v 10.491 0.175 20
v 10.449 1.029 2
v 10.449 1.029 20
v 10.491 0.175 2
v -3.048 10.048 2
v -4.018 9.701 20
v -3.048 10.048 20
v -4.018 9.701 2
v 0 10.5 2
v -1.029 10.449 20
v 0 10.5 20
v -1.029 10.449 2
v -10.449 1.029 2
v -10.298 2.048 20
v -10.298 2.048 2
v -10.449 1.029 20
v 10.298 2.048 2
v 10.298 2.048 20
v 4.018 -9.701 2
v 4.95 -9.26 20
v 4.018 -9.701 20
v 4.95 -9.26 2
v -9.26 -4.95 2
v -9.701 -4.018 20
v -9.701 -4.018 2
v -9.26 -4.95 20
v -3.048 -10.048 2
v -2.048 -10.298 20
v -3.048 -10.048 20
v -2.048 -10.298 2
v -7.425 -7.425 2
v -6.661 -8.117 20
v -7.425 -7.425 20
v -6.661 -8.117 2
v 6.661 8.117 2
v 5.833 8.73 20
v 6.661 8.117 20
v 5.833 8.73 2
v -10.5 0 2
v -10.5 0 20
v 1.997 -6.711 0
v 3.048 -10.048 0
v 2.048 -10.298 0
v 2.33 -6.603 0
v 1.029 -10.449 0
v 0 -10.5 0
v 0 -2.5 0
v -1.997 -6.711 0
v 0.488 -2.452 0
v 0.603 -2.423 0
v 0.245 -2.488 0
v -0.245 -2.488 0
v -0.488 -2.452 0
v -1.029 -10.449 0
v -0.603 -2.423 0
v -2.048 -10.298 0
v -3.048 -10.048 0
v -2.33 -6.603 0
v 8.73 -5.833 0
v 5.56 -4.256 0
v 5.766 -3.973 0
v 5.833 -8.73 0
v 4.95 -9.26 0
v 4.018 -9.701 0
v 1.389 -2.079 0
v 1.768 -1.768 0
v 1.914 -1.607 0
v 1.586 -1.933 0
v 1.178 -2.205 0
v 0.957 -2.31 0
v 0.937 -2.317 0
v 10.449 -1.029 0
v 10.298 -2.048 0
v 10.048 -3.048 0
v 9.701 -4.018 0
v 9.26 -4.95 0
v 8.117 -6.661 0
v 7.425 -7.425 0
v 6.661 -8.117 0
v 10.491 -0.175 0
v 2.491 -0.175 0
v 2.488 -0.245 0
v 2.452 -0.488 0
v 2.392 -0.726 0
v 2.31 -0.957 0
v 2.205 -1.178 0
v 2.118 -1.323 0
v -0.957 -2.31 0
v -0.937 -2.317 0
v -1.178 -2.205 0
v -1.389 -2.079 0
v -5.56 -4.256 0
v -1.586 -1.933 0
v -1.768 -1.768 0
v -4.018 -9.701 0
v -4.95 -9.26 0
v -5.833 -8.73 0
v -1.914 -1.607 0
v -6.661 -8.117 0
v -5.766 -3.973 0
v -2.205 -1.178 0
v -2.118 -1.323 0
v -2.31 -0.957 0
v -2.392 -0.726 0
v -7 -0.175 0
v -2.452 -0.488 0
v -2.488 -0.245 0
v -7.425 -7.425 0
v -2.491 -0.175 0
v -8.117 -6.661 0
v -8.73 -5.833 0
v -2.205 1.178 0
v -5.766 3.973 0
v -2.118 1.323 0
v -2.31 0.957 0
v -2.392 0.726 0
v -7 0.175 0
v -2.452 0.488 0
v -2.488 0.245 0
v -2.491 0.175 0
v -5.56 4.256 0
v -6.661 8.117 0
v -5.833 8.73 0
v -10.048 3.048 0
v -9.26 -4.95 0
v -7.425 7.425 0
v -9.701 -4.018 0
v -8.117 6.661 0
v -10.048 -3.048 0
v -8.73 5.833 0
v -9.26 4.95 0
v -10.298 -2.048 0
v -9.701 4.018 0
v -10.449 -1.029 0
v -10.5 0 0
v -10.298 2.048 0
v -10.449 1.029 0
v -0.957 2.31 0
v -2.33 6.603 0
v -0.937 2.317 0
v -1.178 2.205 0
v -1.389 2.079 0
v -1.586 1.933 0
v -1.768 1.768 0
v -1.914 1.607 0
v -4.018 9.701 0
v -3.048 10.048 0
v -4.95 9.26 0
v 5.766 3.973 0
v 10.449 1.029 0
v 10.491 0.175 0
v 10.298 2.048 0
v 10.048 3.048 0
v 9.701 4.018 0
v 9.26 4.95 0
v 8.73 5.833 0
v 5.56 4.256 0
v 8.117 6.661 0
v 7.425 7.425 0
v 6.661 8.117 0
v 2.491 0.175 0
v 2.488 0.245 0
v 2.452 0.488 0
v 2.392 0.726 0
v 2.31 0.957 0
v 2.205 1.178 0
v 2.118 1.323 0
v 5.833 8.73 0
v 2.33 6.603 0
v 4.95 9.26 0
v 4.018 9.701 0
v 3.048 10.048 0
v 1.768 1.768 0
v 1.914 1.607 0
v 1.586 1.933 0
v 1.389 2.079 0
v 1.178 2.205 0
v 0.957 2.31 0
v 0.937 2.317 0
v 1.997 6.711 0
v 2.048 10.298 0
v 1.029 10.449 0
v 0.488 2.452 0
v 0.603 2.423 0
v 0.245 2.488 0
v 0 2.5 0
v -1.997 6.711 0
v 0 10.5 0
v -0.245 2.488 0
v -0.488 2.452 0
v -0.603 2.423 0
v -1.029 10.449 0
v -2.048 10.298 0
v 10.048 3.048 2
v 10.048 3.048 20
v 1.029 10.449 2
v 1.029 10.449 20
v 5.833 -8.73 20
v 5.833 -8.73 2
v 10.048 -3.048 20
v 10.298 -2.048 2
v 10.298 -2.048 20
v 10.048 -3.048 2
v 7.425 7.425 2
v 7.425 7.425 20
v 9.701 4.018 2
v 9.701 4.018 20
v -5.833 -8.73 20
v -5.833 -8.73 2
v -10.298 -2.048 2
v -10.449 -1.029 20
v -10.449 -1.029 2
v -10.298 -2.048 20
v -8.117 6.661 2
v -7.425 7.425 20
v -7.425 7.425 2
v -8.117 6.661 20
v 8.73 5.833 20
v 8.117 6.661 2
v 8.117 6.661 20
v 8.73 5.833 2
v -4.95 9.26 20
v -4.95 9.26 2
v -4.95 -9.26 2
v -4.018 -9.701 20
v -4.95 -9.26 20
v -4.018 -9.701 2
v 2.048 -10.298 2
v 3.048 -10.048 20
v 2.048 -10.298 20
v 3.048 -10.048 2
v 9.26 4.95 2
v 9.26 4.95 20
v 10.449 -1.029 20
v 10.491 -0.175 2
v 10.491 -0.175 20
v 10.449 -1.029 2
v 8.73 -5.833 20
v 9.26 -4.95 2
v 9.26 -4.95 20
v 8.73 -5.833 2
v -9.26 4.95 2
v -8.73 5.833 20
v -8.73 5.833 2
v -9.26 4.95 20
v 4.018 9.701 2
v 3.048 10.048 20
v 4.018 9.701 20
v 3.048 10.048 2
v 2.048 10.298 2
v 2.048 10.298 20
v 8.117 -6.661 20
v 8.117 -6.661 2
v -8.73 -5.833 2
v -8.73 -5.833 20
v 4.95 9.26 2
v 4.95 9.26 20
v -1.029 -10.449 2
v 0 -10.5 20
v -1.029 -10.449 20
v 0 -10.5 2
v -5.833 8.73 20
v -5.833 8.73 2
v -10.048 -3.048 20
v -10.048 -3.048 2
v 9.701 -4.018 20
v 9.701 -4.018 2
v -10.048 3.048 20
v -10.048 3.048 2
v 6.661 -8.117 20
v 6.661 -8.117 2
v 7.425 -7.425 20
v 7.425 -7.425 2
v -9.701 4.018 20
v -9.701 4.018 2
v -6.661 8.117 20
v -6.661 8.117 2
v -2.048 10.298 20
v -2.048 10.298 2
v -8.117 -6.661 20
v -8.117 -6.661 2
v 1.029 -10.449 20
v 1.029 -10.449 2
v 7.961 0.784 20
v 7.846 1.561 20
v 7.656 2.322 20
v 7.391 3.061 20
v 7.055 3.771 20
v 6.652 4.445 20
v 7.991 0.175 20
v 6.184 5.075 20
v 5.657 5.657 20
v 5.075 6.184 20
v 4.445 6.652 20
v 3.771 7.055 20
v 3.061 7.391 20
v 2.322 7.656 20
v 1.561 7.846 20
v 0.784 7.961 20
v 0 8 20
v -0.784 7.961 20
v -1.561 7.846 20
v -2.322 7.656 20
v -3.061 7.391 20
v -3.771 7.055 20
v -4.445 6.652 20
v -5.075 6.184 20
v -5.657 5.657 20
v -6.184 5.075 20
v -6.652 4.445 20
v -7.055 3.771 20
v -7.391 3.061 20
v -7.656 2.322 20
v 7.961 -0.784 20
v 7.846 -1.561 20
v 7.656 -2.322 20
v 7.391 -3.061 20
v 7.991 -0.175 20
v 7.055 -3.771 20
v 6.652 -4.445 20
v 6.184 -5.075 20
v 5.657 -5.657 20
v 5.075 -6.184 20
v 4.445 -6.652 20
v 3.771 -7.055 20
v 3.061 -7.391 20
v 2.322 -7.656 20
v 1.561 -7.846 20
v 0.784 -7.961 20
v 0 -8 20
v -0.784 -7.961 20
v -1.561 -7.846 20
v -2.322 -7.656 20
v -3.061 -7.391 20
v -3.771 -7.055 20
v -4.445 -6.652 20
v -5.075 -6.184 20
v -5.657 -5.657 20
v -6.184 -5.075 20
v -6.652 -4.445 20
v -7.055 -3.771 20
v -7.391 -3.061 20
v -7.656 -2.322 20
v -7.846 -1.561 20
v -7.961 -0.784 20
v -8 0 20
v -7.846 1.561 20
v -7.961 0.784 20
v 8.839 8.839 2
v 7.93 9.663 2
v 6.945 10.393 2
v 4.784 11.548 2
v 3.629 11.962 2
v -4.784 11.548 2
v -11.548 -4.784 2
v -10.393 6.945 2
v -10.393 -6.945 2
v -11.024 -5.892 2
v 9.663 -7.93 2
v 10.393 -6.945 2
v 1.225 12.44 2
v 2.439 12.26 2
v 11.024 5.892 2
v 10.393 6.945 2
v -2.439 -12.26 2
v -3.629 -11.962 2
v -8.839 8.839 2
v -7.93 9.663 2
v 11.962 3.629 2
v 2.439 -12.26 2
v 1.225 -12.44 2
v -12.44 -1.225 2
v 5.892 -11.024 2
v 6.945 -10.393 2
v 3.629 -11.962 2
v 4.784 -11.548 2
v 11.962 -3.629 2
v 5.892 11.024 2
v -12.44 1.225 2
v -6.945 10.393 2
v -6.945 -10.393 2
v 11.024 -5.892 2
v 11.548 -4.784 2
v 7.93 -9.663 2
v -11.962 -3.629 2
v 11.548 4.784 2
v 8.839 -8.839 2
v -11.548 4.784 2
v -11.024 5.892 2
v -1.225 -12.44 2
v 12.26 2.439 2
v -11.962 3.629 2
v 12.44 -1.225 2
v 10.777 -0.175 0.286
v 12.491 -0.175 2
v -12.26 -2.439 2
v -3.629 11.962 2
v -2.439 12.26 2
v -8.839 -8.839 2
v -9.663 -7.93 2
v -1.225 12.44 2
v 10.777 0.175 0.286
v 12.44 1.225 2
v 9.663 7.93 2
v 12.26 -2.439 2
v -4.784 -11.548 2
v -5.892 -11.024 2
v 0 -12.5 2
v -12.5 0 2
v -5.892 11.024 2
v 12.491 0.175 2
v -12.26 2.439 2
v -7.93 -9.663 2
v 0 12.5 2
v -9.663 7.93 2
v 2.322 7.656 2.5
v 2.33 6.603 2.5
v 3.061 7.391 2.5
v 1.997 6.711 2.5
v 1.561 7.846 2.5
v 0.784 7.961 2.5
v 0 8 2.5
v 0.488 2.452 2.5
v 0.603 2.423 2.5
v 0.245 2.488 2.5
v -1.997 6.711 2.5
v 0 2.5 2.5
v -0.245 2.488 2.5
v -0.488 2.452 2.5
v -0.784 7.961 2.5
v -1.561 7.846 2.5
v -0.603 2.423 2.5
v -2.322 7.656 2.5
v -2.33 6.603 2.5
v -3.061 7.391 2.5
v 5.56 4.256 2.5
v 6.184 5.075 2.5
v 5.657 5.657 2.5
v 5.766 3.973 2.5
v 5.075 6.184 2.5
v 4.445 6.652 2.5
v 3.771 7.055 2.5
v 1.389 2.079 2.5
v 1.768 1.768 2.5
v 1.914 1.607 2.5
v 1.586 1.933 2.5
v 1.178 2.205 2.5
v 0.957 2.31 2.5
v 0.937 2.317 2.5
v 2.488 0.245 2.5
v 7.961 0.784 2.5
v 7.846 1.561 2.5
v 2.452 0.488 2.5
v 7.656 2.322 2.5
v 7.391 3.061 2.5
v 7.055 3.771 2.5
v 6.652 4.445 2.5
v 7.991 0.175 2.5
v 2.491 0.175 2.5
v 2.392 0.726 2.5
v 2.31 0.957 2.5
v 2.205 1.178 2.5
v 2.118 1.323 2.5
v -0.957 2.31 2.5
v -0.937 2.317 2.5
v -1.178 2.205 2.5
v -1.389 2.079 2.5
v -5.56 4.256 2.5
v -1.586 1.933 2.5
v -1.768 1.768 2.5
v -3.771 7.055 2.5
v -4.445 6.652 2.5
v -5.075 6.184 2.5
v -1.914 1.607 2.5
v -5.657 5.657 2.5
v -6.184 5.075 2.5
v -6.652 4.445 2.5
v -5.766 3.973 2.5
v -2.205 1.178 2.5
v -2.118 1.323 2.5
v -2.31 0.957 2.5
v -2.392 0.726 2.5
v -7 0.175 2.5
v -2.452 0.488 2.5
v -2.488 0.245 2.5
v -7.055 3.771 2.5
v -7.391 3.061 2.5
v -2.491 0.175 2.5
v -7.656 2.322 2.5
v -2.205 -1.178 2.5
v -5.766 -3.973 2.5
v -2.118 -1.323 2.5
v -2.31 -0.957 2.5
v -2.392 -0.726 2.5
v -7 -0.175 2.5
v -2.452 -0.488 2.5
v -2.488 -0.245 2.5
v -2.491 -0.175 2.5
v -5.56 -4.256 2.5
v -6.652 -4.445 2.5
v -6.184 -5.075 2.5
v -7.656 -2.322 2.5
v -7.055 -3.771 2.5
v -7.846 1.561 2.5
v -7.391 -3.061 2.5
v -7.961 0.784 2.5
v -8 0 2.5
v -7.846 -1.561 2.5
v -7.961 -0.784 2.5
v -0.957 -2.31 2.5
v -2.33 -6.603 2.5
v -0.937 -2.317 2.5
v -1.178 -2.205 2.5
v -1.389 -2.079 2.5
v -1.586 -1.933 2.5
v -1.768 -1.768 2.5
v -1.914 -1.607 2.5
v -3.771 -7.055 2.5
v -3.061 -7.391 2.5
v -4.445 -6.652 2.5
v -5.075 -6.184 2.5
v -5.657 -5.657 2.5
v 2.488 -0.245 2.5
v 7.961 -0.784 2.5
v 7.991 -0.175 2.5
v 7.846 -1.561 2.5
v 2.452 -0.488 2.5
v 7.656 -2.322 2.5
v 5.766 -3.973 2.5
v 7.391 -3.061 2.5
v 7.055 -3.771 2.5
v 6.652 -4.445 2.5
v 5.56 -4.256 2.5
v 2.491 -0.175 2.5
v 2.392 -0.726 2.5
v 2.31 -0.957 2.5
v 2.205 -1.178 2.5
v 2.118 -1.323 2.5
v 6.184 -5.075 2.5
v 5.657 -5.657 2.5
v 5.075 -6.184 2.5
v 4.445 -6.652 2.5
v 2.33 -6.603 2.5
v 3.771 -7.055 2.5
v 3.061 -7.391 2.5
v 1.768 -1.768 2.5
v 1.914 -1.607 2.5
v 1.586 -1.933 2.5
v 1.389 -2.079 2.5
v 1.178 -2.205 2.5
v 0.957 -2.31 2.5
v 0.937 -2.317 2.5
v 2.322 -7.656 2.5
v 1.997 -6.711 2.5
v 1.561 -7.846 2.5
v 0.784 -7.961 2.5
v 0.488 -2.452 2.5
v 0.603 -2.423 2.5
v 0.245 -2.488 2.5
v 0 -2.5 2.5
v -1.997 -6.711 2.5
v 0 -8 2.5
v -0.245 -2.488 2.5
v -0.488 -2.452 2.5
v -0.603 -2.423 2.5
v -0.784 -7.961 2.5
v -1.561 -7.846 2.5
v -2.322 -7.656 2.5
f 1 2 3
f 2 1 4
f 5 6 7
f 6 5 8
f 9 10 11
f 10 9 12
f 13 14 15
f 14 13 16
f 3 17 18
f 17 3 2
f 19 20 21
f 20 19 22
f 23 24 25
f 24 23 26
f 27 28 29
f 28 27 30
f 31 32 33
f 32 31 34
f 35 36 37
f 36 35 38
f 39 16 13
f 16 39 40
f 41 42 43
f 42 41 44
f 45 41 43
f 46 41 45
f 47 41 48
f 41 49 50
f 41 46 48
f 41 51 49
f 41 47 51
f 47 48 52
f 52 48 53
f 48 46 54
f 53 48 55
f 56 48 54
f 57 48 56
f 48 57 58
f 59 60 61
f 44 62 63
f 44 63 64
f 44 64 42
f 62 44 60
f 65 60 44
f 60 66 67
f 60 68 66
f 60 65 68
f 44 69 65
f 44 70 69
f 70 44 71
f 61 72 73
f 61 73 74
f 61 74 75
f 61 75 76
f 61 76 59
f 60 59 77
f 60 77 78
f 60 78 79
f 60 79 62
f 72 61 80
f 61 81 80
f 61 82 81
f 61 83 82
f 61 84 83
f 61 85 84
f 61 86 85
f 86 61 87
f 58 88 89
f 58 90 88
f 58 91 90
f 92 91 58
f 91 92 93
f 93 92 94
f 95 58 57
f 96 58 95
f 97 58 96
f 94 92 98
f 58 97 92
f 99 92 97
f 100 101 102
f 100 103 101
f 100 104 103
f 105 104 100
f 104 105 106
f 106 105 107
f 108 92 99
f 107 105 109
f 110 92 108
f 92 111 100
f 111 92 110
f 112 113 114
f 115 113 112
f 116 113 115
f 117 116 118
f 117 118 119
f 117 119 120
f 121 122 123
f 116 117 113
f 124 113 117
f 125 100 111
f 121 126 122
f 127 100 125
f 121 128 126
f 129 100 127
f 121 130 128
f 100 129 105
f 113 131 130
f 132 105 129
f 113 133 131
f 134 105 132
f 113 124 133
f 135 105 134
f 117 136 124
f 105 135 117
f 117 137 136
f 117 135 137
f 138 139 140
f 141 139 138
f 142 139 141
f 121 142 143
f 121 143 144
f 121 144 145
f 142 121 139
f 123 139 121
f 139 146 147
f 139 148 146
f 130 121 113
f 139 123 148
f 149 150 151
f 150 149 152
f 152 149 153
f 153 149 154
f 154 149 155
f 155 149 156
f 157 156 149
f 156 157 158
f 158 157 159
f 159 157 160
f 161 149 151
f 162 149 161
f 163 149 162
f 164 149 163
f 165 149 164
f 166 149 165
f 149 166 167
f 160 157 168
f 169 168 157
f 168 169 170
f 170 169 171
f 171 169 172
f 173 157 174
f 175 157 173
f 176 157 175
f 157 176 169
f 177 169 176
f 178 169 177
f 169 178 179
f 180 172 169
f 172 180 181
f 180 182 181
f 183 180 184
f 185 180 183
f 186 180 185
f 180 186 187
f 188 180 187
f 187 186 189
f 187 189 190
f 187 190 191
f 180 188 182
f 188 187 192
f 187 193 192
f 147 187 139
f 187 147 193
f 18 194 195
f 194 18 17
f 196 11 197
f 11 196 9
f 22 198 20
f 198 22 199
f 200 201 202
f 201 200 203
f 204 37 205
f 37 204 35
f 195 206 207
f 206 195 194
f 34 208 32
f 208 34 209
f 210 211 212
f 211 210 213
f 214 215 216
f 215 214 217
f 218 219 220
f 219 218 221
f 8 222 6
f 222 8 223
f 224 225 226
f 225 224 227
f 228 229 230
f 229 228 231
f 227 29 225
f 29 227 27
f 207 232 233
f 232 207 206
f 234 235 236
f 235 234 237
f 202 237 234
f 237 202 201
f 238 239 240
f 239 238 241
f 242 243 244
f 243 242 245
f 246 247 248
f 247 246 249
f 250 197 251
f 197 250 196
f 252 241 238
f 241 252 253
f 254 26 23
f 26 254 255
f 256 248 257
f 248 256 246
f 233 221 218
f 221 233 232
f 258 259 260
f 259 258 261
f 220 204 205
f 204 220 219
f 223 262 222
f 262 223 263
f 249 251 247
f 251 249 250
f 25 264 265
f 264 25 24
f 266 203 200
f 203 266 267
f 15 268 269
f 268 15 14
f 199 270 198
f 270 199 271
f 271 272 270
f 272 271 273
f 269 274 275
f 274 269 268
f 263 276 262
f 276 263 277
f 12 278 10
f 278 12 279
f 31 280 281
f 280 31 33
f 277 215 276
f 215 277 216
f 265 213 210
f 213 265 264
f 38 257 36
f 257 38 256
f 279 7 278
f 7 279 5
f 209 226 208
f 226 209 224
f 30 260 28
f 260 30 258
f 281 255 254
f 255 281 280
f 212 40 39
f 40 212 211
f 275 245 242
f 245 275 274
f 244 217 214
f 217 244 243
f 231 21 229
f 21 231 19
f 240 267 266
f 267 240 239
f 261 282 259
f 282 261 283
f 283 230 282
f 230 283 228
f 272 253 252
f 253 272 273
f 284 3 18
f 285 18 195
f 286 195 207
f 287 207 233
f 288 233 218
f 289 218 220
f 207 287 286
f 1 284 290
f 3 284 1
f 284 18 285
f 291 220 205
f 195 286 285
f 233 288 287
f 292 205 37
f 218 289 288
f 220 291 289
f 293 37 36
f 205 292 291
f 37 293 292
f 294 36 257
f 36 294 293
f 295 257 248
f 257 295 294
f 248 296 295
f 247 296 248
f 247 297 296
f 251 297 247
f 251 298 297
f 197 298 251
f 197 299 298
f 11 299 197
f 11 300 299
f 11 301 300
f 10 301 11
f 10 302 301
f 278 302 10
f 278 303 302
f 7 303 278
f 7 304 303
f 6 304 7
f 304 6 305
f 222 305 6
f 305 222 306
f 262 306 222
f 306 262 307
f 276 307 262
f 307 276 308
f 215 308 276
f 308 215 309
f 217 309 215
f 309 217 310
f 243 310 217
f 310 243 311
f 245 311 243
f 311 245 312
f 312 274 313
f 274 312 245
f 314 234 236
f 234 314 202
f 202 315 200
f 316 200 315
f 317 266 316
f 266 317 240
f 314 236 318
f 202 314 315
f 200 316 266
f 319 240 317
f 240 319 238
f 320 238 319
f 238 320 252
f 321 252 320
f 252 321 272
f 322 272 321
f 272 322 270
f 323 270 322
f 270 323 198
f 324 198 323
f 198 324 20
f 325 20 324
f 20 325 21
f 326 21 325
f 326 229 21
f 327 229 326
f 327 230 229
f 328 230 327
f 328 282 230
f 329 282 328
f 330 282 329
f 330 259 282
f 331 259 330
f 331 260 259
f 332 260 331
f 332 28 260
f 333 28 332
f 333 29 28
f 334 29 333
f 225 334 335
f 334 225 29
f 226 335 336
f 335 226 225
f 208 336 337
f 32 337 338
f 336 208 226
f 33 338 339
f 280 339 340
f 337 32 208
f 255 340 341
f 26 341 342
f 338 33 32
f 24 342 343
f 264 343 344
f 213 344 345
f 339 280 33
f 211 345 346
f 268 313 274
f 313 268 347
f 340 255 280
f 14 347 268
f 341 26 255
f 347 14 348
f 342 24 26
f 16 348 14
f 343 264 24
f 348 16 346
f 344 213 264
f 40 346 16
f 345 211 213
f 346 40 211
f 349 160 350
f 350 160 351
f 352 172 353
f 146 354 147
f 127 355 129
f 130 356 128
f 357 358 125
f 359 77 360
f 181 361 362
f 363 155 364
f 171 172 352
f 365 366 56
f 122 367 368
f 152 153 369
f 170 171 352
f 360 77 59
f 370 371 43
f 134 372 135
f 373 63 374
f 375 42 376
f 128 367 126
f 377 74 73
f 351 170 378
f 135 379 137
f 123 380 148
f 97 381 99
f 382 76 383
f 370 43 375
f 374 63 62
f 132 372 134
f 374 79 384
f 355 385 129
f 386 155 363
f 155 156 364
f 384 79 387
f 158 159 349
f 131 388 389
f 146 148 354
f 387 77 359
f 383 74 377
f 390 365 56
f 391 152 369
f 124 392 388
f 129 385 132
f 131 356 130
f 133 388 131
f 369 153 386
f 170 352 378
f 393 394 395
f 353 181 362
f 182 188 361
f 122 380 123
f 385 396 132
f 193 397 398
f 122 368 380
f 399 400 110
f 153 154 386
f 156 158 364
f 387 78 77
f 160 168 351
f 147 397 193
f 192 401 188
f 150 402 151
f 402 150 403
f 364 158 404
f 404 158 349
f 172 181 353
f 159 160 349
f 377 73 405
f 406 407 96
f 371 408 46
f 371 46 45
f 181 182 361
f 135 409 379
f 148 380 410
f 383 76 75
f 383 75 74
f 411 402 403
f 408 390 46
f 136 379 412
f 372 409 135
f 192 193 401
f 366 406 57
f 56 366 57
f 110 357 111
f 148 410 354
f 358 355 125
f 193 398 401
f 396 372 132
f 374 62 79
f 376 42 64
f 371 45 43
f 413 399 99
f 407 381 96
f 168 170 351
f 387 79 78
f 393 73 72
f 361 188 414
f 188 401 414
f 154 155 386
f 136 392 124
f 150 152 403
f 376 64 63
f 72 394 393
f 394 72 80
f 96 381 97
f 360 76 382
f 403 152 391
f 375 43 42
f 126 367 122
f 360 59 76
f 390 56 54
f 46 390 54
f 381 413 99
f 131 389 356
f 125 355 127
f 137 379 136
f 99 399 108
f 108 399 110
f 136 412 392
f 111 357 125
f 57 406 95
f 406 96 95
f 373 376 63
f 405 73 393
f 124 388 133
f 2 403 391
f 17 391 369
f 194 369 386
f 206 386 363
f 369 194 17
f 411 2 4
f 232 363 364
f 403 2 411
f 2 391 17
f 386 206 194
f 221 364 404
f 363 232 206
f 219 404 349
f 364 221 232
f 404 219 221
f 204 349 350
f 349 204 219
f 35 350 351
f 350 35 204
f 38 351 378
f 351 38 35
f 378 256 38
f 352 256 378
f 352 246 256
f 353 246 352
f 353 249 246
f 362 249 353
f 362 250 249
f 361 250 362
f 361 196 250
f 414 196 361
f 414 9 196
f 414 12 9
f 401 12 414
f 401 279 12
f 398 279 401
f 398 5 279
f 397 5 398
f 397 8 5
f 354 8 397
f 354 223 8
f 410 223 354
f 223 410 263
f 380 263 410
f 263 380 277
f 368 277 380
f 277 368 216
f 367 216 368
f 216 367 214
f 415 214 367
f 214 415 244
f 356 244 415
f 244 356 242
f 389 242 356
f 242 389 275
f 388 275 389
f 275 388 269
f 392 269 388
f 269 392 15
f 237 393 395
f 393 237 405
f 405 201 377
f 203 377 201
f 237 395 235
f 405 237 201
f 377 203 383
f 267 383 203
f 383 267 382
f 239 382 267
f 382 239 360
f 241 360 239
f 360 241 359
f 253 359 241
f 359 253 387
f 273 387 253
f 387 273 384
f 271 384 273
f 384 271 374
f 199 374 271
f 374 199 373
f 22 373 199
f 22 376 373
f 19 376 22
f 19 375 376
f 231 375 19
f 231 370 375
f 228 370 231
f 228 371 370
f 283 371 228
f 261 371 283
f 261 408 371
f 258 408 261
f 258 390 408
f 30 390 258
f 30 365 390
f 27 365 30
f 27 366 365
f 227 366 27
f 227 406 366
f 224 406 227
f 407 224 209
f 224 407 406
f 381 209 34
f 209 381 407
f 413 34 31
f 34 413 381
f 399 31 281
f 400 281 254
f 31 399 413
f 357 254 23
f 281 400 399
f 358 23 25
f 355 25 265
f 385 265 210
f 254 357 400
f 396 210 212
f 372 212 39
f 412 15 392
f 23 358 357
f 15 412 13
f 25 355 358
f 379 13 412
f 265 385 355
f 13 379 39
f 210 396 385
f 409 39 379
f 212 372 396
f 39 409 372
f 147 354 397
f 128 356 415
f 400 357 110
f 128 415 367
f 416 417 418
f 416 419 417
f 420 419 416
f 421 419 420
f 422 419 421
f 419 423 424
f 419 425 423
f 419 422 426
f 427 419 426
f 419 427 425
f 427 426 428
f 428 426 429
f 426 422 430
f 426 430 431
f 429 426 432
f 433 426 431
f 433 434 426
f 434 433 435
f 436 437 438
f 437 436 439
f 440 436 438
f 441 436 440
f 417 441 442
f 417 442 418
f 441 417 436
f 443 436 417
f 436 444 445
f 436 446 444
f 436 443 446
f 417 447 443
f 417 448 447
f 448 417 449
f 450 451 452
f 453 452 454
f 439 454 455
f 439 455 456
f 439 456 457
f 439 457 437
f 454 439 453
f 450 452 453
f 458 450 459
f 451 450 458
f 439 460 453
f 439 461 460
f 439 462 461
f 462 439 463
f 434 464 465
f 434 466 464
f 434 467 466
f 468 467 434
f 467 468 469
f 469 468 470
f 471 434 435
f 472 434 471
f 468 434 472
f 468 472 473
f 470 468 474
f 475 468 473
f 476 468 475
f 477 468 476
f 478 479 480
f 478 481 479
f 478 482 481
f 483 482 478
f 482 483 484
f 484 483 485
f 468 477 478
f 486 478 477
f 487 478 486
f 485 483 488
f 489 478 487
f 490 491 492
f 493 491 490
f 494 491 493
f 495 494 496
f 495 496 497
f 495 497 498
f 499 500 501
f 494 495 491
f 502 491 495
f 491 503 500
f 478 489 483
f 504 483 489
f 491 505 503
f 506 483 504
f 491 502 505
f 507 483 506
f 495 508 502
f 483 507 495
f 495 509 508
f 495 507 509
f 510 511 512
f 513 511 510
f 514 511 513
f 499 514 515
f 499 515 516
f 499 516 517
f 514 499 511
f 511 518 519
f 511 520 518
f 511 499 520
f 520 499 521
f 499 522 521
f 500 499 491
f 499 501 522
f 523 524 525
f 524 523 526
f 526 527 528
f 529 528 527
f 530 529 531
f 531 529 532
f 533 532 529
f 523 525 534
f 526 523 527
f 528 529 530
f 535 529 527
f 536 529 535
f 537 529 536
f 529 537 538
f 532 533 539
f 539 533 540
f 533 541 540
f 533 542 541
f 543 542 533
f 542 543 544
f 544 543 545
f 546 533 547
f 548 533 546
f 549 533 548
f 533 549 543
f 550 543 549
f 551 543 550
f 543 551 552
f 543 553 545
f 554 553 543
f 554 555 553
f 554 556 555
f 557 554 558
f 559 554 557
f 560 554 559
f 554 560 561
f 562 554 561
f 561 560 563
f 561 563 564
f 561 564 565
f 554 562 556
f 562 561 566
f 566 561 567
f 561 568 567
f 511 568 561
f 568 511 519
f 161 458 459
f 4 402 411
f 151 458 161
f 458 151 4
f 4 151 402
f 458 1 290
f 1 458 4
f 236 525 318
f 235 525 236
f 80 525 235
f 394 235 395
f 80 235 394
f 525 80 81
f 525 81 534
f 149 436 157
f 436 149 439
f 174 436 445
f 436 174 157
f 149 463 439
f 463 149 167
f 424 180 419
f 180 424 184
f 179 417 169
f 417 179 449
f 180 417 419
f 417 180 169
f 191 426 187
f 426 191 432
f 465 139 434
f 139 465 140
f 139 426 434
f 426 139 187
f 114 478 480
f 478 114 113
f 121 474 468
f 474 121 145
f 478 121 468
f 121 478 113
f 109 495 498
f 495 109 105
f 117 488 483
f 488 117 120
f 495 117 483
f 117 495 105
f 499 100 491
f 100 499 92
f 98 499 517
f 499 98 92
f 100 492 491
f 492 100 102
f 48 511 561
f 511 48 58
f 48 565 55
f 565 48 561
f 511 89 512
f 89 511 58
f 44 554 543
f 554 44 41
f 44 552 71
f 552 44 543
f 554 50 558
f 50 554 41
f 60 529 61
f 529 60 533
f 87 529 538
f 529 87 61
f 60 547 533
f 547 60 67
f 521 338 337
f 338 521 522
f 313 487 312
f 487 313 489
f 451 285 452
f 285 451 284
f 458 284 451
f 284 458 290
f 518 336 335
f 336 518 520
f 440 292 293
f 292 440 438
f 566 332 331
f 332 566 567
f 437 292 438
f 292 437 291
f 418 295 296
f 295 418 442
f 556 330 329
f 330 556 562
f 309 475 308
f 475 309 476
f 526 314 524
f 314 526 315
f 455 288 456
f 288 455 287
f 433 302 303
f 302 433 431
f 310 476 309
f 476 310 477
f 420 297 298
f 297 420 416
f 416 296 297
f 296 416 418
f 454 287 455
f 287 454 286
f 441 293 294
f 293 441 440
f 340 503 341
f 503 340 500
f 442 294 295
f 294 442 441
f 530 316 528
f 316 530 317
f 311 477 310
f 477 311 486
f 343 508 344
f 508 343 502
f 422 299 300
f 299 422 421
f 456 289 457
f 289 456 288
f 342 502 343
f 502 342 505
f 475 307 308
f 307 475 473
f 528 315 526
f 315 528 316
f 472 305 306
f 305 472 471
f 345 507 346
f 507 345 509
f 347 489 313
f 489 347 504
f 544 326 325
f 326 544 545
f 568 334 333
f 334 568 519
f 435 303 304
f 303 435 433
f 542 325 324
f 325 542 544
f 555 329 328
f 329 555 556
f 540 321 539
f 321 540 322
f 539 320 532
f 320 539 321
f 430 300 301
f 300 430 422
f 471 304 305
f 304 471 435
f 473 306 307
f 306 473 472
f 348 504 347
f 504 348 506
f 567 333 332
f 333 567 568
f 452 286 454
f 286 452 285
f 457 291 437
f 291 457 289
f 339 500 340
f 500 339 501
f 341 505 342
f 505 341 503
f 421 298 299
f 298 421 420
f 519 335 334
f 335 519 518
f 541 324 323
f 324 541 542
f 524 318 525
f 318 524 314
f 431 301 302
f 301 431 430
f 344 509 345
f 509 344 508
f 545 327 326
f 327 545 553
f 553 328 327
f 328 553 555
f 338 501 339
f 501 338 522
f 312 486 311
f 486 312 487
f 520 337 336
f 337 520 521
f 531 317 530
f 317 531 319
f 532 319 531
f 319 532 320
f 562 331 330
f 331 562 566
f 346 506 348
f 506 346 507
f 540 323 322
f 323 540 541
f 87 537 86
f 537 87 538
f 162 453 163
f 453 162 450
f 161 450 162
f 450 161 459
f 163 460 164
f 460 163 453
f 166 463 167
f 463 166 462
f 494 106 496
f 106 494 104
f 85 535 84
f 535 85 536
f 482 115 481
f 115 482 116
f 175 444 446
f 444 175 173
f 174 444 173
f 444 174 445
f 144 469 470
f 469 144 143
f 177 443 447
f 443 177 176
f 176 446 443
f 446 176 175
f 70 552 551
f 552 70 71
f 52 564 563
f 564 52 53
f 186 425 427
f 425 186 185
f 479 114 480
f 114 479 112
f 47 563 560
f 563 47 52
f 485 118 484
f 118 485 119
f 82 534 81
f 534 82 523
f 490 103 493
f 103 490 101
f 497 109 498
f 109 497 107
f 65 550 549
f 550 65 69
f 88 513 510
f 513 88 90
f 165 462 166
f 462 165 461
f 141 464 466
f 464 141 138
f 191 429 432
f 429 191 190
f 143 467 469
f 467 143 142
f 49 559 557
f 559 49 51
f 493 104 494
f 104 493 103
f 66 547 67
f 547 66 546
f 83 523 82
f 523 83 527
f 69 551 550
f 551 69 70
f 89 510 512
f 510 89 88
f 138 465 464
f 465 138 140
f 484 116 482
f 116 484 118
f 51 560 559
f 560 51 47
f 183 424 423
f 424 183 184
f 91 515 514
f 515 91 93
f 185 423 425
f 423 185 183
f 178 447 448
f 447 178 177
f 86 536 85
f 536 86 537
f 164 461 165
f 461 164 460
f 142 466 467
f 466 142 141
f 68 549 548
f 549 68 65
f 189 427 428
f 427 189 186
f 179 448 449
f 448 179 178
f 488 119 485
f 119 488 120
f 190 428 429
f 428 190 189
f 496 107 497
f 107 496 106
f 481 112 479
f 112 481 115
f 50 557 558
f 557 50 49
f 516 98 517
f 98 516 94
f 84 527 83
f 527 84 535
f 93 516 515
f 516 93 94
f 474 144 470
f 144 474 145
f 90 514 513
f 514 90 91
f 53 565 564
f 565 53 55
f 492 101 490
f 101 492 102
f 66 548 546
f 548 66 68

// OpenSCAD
/* [Hidden] */ ////////////////////////////
$fn = 64;

/* [Plug] */ ////////////////////////////
// Innerdiameter of the Plug (aka ID of the Pipe)?
id = 21;

// Outerdiameter of the Plug (aka OD of the Pipe; used for the chamfer)?
od = 25;

// Height?
h = 20;

// Wallthickness?
w = 2.5;

// Slotted?
s = 1; // [1:Yes, 0:No]

/* [Cuts] */ ////////////////////////////
// Center-Hole-Diameter?
chd = 5;

// Cut-Diameter?
cd = 14;

// How many Cuts?
cc = 10;

// Cut-Thickness? 
cw = 0.35;

////////////////////////////

difference() {
	union() {
		cylinder(r=id/2, h=h);

		hull() {
			cylinder(r=id/2, h=(od-id)/2);
			translate([0, 0, (od-id)/2]) cylinder(r=od/2, h=0.00001);
		}
	}
	
	union() {
		translate([0, 0, w]) cylinder(r=(id/2-w), h=h-w);
		
		// slot
		if(s==1) {
			translate([0, -cw/2, 0]) cube([od/2, cw, h]);
		}
		
		// cuts
		for(i = [0:cc]) {
			rotate([0, 0, i*360/cc]) translate([0, -cw/2, 0]) cube([cd/2, cw, w]);
		}
		cylinder(r=chd/2, h=w);
	}
}
